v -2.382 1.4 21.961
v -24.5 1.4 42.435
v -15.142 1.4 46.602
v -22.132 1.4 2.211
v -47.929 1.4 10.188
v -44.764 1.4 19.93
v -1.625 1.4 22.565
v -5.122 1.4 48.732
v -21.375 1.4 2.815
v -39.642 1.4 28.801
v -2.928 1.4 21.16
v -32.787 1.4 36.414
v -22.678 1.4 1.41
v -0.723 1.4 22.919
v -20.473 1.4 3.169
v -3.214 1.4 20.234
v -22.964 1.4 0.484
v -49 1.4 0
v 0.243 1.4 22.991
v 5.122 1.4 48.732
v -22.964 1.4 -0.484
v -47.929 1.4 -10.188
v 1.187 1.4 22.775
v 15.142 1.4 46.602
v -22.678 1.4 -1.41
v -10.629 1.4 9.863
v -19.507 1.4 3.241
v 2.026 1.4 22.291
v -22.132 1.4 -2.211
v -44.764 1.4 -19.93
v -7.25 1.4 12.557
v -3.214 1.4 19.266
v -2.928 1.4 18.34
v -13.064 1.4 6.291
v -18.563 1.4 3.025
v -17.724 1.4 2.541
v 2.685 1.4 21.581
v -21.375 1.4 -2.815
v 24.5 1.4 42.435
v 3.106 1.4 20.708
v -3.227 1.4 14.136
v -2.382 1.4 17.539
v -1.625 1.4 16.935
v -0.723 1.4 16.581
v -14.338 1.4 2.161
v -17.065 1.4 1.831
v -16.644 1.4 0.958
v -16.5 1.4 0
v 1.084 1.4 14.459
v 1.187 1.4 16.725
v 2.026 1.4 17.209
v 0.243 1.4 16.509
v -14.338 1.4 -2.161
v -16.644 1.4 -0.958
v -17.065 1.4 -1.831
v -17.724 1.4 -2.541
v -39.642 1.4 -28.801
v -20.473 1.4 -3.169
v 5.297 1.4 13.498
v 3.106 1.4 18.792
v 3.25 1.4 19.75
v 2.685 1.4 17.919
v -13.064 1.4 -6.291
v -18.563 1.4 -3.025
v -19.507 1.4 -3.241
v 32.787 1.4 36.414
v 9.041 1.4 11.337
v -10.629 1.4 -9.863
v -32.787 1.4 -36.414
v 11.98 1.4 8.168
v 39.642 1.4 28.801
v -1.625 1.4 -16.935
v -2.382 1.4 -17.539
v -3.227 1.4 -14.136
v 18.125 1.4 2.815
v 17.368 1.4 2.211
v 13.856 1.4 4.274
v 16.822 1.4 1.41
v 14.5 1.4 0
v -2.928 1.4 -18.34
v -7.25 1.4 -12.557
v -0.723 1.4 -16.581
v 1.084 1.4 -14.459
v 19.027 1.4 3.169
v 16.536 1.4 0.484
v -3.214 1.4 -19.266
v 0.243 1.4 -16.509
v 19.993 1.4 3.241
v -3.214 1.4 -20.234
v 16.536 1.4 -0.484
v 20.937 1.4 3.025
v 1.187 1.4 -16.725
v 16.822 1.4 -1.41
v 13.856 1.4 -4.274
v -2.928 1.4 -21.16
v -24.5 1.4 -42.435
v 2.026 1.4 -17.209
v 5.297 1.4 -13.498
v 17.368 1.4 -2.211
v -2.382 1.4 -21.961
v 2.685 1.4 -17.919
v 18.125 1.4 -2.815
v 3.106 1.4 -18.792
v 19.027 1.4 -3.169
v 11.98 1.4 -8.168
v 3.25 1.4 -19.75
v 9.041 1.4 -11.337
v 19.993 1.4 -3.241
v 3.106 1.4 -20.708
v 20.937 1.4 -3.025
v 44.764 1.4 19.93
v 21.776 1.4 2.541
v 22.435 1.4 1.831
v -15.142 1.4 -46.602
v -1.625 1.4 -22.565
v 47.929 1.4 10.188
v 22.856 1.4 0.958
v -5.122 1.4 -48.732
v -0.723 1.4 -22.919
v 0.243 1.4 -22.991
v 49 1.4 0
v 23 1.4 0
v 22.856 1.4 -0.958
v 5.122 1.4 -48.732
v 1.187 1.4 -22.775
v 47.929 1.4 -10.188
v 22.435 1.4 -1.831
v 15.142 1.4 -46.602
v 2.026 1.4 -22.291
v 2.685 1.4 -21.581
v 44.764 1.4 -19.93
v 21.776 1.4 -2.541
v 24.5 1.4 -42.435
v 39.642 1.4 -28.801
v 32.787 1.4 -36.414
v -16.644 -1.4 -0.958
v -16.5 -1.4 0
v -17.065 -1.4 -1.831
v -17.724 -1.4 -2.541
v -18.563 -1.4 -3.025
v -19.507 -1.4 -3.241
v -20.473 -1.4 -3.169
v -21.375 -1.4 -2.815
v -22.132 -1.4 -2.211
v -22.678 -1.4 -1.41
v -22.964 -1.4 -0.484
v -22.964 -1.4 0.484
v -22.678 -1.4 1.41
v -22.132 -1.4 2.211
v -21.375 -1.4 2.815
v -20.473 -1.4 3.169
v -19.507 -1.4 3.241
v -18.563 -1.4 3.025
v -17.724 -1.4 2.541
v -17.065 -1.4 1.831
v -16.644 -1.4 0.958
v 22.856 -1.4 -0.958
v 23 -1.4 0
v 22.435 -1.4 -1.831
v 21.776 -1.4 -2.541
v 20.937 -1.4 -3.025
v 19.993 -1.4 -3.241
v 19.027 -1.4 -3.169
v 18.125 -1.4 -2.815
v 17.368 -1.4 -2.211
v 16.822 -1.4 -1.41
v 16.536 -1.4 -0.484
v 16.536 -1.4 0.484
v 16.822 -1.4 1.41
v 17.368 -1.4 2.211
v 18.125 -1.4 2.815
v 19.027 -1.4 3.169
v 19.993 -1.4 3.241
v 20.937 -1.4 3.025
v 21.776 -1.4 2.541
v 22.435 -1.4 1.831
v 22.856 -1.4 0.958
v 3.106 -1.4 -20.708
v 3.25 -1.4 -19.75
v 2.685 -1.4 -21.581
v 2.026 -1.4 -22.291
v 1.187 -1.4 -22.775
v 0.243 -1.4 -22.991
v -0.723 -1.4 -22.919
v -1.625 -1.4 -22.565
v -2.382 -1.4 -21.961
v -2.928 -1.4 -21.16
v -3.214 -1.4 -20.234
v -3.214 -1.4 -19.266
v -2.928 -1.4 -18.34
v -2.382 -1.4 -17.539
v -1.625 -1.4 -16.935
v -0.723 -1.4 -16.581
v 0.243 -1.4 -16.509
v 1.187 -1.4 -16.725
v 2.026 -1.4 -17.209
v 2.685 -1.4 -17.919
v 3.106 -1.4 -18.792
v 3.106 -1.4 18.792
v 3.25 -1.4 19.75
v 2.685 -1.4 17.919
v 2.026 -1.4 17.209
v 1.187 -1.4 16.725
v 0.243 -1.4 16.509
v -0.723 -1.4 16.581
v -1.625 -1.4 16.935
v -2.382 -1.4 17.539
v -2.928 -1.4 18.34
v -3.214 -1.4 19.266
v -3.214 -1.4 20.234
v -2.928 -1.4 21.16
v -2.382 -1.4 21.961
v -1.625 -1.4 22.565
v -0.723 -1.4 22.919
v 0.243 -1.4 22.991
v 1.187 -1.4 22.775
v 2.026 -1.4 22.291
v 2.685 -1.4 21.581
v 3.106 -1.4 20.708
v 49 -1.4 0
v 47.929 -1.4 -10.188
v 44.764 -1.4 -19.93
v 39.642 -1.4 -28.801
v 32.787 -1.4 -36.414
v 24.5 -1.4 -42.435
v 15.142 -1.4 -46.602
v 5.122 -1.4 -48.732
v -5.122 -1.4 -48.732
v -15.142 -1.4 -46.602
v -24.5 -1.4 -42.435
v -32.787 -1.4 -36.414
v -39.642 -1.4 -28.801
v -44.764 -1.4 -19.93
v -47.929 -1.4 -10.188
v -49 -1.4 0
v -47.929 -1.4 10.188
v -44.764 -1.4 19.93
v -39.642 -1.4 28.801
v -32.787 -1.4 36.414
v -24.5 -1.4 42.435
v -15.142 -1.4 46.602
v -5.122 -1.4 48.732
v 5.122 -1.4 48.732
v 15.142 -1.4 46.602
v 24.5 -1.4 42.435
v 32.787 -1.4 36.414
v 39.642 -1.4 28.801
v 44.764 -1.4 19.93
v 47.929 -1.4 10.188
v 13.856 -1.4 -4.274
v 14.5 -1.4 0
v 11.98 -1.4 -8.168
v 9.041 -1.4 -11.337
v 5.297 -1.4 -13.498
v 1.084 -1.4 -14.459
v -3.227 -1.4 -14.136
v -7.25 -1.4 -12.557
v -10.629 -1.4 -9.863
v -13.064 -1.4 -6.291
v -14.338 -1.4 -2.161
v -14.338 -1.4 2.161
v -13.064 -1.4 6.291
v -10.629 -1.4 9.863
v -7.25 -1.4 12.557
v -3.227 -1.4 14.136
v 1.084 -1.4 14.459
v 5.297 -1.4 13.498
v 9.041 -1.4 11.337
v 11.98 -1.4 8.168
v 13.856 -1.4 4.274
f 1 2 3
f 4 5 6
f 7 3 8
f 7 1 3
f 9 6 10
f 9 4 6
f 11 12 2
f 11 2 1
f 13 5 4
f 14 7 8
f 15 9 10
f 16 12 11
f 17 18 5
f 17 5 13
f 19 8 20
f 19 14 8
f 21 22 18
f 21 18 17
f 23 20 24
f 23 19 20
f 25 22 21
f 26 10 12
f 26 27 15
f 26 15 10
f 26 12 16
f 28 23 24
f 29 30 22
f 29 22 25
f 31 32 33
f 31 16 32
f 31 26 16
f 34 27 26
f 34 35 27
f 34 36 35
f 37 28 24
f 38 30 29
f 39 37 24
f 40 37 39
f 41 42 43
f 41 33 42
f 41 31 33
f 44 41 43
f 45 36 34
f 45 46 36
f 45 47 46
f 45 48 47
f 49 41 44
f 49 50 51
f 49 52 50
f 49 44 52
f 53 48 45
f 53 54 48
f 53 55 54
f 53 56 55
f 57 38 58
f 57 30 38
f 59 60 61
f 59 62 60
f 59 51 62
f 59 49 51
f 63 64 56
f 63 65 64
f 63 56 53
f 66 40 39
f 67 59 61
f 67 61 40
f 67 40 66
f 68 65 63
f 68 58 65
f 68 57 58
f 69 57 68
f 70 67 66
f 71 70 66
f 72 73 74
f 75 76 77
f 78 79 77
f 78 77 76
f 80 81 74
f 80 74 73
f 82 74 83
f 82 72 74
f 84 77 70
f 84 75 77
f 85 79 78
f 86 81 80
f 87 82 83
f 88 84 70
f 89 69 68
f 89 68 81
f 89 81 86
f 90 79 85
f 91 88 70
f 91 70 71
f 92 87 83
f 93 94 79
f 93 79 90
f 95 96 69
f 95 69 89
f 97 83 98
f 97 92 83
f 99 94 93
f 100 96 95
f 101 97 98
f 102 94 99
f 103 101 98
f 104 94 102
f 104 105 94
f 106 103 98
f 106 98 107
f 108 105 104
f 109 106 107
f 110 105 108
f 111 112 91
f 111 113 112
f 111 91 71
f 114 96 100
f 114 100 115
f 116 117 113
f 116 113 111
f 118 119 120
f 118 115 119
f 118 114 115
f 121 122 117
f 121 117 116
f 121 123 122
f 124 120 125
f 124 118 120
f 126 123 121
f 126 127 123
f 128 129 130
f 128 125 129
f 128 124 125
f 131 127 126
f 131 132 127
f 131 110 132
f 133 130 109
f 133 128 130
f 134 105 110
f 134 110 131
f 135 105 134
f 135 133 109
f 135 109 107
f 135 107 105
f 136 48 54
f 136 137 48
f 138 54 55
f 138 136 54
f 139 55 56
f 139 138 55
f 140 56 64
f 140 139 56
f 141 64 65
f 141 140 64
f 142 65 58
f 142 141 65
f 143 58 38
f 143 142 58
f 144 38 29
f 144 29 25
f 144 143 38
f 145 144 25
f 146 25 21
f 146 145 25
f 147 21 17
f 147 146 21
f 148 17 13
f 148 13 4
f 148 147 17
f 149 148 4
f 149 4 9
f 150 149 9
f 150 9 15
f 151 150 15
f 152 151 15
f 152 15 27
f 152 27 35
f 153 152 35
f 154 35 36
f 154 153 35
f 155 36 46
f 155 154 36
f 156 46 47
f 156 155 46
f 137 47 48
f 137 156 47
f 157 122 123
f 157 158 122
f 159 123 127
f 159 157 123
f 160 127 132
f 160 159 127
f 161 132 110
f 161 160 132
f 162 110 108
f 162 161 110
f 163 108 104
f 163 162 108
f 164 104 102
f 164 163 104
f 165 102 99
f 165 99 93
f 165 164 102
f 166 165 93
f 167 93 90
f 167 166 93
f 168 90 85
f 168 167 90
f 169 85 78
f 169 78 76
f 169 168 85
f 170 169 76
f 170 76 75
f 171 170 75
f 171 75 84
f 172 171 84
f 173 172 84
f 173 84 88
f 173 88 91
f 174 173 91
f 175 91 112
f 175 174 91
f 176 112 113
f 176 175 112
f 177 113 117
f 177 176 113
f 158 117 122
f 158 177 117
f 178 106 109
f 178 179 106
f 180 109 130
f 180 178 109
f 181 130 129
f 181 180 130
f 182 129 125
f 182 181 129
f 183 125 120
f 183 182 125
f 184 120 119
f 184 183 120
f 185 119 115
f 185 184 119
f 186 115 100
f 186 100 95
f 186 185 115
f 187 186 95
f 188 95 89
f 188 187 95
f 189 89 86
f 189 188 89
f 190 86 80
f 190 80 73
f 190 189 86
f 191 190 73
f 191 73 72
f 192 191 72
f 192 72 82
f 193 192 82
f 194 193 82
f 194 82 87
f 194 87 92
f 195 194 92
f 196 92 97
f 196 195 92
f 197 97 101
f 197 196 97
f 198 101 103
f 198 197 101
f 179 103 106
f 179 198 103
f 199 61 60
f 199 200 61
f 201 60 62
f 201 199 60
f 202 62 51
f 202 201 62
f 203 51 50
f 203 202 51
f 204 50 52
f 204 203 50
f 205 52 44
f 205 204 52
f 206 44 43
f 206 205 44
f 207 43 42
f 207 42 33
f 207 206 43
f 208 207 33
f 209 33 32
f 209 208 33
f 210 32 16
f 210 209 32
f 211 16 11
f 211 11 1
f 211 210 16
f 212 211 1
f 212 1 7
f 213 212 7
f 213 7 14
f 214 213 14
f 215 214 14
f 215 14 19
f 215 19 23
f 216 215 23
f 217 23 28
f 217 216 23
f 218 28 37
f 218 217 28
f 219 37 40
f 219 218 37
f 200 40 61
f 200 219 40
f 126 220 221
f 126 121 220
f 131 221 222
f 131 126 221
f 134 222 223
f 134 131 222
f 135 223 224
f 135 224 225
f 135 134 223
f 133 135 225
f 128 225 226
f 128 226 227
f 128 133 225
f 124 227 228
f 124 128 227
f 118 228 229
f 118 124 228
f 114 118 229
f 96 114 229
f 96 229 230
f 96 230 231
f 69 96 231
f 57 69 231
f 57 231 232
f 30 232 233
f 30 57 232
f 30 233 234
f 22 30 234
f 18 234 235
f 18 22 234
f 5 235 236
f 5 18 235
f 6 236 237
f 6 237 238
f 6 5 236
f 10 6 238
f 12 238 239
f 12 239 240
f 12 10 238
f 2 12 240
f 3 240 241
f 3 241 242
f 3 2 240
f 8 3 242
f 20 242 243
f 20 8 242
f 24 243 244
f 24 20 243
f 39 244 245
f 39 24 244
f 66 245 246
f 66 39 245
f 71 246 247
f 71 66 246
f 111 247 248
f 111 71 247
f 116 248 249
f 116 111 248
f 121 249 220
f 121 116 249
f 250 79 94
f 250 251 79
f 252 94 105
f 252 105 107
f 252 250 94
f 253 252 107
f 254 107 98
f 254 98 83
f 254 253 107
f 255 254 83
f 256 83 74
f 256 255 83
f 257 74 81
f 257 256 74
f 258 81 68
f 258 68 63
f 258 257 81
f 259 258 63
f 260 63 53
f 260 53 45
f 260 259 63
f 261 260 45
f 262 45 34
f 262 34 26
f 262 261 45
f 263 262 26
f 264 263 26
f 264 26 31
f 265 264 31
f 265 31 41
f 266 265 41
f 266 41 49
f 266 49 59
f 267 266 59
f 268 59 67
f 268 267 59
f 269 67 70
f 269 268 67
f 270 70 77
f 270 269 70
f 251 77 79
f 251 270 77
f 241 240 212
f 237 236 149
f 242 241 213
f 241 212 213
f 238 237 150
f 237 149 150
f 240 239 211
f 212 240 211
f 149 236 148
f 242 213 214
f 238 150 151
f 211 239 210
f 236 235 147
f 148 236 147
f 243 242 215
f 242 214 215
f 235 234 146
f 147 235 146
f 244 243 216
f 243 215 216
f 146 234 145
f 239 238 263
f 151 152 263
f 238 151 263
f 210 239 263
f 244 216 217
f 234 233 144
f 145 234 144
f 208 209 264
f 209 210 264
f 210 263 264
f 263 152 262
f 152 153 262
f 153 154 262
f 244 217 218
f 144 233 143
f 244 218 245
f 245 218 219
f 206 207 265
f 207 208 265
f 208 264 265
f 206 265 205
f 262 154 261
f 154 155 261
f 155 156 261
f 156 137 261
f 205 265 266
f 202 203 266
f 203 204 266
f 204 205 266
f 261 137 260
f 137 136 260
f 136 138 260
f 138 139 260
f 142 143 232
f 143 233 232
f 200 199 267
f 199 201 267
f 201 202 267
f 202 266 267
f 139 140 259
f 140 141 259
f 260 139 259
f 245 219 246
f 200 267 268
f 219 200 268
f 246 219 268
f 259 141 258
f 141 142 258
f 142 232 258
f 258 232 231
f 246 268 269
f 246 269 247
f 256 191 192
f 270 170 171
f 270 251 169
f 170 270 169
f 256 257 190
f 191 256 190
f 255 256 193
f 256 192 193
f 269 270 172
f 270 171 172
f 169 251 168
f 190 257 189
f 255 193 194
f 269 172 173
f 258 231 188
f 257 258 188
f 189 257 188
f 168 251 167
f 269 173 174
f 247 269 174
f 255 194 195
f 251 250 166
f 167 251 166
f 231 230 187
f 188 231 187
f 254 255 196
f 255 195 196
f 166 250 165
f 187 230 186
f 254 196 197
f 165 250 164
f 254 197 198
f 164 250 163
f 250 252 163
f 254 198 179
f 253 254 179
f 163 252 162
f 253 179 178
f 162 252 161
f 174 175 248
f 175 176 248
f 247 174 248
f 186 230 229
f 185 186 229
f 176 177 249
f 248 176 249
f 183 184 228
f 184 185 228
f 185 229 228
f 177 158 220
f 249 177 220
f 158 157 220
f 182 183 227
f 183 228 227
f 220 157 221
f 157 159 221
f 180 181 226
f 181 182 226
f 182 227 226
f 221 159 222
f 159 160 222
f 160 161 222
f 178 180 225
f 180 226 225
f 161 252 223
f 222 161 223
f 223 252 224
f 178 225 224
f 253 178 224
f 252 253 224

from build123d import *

# Parameters (mm, degrees)
SKETCH1_R           = 49
SKETCH1_R_2         = 14.5
SKETCH1_R_3         = 3.25
BOSS_EXTRUDE1_DEPTH = 1.4


with BuildPart() as part:
    # Sketch1 → Boss-Extrude1 (new body, symmetric)
    with BuildSketch(Plane(origin=(0, 0, 0), x_dir=(1, 0, 0), z_dir=(0, 1, 0))):
        Circle(SKETCH1_R)
        Circle(SKETCH1_R_2, mode=Mode.SUBTRACT)
        with Locations((0, 19.75)):
            Circle(SKETCH1_R_3, mode=Mode.SUBTRACT)
        with Locations((19.75, 0)):
            Circle(SKETCH1_R_3, mode=Mode.SUBTRACT)
        with Locations((0, -19.75)):
            Circle(SKETCH1_R_3, mode=Mode.SUBTRACT)
        with Locations((-19.75, 0)):
            Circle(SKETCH1_R_3, mode=Mode.SUBTRACT)
    extrude(amount=BOSS_EXTRUDE1_DEPTH, both=True)


solid = part.part
